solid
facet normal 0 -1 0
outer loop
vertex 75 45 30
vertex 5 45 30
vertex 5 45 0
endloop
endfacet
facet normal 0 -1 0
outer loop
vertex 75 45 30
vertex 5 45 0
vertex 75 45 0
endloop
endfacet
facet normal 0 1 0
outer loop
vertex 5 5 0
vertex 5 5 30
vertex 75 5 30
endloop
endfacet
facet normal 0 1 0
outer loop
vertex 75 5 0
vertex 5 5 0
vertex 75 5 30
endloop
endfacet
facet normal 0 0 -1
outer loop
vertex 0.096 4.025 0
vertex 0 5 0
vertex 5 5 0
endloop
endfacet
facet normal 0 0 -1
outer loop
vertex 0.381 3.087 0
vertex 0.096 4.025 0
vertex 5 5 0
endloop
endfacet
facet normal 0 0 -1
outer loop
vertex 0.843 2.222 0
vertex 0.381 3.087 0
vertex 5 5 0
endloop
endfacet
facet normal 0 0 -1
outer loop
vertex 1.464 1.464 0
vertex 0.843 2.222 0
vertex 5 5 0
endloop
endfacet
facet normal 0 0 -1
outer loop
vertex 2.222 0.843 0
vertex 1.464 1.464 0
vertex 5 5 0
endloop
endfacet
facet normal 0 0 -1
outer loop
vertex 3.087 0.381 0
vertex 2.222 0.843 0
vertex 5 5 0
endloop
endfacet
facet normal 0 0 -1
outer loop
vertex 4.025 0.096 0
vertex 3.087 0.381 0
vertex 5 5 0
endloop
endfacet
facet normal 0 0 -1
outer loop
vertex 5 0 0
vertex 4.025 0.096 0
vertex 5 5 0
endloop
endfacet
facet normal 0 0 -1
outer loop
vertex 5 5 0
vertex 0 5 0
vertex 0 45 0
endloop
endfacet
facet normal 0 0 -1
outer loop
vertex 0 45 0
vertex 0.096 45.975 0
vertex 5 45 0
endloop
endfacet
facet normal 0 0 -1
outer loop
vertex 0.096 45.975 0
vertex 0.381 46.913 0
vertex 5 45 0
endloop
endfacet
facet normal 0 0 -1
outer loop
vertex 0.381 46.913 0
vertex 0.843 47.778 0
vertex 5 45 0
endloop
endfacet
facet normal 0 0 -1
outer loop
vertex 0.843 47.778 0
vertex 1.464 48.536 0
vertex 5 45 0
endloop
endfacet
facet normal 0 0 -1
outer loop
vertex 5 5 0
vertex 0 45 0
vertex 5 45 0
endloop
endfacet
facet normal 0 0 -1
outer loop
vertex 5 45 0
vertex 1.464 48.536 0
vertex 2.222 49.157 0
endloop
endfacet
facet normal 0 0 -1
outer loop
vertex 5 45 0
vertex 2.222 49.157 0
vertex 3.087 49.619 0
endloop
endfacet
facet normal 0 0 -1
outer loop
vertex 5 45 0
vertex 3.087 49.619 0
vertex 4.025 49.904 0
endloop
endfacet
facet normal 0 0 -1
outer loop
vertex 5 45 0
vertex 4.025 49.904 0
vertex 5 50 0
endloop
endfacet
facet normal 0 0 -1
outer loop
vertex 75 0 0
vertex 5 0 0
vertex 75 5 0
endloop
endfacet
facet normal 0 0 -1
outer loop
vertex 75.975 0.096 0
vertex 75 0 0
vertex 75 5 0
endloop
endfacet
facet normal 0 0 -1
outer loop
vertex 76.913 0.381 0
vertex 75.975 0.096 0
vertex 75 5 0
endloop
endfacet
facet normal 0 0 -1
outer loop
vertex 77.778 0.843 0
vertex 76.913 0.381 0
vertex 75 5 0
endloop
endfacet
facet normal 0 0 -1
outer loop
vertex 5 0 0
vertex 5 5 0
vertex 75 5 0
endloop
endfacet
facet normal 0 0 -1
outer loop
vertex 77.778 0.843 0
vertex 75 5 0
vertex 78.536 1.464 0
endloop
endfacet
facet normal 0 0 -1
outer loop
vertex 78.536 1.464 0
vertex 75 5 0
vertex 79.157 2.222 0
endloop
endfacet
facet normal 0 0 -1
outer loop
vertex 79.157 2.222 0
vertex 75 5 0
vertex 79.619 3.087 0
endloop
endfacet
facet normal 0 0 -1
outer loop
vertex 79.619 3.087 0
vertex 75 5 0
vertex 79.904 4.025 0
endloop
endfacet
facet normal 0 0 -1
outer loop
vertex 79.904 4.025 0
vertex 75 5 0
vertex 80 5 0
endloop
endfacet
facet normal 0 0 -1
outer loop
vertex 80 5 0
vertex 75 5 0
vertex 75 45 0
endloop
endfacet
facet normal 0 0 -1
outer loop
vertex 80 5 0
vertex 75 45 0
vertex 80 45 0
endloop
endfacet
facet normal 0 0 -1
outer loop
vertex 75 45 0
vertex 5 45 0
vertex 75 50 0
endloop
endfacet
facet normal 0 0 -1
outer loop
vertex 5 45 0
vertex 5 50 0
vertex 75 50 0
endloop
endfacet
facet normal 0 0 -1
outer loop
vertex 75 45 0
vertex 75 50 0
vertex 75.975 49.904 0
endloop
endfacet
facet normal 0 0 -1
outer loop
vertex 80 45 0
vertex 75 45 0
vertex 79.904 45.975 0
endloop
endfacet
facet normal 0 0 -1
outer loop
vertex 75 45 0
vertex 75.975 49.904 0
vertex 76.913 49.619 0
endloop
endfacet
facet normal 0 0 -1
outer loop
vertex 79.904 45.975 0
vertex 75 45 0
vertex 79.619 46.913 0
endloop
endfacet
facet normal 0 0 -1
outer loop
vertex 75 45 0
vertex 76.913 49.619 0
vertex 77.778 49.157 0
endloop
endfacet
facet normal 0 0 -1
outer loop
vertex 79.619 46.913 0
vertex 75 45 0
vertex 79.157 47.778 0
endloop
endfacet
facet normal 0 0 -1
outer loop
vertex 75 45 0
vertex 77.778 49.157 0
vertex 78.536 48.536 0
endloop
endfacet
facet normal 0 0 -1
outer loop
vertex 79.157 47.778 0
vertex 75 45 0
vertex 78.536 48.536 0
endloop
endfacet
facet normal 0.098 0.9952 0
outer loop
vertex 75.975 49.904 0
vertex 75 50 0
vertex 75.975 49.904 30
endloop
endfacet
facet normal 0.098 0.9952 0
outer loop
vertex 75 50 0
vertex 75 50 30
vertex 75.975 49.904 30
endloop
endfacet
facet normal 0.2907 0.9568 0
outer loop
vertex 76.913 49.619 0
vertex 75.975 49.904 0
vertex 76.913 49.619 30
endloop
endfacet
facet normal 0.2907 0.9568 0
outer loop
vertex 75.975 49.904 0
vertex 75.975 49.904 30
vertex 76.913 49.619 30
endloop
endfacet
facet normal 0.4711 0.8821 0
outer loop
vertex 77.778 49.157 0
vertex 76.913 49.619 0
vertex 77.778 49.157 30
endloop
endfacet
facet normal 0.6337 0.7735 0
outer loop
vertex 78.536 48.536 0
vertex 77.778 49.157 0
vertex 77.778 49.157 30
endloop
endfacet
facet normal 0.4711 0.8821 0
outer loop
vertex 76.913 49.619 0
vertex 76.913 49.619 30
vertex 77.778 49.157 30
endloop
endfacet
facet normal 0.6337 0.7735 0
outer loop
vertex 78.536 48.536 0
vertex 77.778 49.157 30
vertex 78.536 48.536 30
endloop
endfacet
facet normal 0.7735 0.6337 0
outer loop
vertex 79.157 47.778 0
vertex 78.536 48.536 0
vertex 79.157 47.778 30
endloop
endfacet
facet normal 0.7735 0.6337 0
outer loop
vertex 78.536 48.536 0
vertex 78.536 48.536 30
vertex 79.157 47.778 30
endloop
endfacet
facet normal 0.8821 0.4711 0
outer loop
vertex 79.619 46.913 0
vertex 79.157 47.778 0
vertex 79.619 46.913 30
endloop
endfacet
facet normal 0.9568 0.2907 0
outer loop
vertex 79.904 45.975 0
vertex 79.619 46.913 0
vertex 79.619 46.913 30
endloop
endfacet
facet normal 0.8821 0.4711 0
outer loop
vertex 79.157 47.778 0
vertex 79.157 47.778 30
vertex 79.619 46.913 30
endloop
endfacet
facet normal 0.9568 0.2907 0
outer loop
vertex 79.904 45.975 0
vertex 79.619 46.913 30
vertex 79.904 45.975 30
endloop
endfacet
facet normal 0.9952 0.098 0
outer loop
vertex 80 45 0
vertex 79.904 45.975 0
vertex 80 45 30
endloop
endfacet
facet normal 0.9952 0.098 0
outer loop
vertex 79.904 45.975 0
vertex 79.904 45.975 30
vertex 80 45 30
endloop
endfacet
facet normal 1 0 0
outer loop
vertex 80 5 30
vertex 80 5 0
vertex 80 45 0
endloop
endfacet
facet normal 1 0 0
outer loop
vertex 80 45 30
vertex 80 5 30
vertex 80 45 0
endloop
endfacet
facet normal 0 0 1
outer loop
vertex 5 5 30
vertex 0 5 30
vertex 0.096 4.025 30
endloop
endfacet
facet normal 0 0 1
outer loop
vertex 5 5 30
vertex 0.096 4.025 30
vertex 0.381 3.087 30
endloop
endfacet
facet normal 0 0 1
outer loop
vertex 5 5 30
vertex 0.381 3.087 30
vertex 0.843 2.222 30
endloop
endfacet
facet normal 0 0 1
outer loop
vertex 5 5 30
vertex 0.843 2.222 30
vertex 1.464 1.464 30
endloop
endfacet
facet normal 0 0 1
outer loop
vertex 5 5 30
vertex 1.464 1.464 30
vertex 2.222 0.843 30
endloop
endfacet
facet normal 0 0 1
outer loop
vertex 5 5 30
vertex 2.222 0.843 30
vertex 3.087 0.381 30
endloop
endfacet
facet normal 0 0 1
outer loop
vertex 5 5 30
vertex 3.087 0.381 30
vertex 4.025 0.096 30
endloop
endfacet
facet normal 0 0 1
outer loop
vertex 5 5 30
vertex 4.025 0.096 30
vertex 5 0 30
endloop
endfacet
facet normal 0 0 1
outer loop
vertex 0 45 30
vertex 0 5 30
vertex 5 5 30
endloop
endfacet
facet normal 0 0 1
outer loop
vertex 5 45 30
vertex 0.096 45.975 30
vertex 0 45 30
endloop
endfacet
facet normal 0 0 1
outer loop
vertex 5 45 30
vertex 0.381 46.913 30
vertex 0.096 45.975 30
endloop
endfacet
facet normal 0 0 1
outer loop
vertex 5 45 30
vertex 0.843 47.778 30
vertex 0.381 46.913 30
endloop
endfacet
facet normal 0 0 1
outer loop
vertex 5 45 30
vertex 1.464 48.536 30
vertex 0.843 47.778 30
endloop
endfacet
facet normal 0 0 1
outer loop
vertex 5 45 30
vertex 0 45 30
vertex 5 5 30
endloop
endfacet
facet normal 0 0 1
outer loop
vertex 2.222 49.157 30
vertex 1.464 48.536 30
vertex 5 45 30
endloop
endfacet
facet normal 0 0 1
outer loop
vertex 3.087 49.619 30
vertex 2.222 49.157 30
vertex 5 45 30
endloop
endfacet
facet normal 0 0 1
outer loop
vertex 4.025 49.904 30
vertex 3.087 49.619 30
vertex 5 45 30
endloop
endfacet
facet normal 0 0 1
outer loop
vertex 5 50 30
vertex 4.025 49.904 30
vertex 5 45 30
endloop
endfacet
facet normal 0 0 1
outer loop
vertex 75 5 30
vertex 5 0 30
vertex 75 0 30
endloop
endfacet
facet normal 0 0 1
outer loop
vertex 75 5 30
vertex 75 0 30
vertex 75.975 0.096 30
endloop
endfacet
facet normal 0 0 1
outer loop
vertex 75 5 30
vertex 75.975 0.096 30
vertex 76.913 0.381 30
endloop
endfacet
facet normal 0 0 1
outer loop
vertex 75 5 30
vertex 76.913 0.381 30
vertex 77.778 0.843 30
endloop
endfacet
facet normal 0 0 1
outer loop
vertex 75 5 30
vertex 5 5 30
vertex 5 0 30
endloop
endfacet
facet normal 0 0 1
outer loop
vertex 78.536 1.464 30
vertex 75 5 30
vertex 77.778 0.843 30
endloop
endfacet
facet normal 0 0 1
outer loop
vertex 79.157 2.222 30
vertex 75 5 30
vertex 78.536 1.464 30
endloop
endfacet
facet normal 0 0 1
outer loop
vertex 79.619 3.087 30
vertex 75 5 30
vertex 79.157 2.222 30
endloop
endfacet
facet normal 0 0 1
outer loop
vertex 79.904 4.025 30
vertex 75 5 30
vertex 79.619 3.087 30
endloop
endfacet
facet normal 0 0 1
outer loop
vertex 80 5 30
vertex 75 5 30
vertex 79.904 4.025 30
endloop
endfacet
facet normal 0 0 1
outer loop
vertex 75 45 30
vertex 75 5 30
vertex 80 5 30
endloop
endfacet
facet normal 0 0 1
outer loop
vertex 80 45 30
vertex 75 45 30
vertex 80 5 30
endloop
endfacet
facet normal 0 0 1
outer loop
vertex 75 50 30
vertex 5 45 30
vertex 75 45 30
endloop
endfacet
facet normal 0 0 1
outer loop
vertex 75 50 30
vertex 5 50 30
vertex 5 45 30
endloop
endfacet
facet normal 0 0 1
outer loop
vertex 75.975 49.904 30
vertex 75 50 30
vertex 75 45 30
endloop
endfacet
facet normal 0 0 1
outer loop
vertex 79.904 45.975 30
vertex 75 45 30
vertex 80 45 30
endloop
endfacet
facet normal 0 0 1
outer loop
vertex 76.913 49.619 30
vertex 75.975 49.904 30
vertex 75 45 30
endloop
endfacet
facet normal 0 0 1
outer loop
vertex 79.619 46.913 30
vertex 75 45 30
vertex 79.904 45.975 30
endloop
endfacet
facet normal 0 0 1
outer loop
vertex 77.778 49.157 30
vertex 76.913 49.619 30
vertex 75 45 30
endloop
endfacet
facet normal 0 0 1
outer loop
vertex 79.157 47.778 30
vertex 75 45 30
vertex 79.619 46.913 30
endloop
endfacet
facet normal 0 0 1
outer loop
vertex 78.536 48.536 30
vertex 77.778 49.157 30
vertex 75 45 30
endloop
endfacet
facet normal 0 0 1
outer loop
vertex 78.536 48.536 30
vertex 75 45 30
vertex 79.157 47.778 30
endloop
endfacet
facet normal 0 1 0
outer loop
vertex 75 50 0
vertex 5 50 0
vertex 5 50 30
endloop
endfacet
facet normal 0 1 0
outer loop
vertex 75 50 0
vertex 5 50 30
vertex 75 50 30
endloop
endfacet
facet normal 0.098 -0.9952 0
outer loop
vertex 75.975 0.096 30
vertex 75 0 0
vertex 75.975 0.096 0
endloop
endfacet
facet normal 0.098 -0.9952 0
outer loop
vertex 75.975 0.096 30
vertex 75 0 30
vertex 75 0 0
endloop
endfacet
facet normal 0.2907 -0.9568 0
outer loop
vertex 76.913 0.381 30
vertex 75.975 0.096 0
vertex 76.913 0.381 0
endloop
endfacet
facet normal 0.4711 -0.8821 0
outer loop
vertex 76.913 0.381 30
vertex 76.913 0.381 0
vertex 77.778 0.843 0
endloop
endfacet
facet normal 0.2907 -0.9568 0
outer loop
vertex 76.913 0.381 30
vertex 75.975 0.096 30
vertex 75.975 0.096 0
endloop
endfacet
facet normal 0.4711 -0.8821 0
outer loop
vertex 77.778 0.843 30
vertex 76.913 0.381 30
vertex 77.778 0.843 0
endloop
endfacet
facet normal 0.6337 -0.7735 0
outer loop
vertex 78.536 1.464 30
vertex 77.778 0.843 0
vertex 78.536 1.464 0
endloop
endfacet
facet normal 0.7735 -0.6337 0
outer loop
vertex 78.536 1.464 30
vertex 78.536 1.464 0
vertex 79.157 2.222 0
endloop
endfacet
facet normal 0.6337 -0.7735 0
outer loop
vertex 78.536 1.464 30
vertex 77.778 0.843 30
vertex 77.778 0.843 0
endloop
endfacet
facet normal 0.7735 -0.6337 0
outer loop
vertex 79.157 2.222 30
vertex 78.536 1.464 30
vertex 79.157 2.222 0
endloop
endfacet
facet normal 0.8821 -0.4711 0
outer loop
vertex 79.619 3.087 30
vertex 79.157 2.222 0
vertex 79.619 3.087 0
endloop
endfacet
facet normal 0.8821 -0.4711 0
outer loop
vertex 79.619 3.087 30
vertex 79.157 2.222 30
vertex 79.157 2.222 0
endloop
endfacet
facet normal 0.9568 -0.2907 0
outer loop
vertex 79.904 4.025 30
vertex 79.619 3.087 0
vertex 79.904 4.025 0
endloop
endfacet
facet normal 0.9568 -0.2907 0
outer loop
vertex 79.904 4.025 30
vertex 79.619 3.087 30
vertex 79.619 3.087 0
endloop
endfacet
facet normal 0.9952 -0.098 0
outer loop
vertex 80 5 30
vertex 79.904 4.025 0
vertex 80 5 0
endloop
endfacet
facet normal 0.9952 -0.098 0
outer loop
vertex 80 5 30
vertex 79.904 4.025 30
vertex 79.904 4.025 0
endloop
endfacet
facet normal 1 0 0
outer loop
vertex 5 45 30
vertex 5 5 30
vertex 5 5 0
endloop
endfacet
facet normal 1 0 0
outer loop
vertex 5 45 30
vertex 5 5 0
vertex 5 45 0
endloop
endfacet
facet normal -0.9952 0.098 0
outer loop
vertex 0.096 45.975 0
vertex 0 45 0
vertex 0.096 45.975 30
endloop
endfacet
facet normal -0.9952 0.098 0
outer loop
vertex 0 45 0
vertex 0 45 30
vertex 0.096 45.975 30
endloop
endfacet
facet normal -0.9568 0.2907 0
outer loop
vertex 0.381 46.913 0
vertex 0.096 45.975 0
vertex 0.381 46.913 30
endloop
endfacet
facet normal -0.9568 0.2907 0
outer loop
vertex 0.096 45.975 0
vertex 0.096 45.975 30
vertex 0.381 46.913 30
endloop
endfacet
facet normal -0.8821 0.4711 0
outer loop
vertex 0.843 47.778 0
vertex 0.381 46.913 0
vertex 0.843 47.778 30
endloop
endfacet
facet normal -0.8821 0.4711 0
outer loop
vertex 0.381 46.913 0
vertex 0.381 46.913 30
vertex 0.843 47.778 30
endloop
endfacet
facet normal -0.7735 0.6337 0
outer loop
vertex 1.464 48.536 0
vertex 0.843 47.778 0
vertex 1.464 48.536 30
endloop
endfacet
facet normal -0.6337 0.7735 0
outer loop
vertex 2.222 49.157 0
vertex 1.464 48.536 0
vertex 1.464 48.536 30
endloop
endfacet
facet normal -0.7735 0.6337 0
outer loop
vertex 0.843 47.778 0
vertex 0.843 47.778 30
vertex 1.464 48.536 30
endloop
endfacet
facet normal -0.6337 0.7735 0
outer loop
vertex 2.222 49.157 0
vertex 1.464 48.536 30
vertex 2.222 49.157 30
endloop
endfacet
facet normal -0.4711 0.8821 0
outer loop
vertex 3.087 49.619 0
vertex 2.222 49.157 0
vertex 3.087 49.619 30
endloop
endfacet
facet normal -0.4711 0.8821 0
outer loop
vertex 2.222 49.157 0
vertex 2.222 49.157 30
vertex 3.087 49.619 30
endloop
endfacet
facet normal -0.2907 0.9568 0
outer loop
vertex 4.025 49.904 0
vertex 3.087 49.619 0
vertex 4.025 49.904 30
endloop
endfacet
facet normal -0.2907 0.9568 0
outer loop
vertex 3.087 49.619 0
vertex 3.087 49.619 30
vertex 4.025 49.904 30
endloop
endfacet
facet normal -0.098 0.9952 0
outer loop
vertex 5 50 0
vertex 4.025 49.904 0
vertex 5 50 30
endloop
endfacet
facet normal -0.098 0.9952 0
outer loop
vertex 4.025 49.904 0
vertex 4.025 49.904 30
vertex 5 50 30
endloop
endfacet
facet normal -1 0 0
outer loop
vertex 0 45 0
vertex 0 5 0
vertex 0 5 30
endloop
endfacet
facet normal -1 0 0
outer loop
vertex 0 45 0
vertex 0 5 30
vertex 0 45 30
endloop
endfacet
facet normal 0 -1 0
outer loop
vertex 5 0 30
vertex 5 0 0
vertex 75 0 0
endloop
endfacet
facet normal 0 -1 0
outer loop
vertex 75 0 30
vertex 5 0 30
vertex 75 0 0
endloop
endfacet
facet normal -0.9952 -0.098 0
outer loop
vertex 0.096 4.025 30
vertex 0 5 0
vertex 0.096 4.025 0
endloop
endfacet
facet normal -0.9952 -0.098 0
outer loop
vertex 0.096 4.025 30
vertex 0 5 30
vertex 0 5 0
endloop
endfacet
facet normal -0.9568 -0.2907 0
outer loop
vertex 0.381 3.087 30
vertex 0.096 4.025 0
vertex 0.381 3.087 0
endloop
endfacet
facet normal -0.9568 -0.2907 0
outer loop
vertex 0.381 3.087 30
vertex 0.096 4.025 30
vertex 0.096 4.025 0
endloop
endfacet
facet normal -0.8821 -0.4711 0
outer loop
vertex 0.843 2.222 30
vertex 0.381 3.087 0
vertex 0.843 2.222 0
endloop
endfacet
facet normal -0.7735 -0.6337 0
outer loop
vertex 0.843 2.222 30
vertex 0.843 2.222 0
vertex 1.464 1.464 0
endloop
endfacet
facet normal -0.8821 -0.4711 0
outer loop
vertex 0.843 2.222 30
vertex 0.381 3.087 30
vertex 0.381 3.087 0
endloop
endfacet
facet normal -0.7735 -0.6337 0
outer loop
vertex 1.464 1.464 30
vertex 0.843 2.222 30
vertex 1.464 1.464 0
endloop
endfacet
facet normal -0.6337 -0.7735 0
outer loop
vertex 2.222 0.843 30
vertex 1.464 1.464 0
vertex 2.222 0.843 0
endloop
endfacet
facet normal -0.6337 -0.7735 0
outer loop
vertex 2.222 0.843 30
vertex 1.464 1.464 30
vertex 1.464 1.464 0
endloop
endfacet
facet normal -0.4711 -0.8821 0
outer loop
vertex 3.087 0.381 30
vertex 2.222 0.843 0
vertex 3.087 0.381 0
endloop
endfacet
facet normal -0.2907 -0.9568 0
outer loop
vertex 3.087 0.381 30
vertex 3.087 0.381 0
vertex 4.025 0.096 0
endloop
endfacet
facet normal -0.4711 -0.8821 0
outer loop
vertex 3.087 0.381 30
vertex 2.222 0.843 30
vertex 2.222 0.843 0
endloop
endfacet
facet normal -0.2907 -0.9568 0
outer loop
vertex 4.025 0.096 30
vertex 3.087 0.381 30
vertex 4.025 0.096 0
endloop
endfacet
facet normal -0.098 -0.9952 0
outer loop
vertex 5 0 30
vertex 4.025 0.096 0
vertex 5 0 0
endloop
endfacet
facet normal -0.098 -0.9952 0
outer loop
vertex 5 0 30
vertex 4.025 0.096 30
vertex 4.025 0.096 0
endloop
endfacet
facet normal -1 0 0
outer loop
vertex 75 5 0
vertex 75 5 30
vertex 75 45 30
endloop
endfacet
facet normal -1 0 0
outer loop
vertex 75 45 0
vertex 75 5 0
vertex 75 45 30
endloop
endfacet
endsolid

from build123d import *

# Parameters (mm, degrees)
F0_W     = 80
F0_H     = 50
F1_DEPTH = 30
F2_W     = 70
F2_H     = 40
F3_DEPTH = 30.001
F4_R     = 5


with BuildPart() as f1:
    # F0 (on Top) → F1 (new body)
    with BuildSketch(Plane.XY):
        with Locations((40, 25)):
            Rectangle(F0_W, F0_H)
    extrude(amount=F1_DEPTH)

    # F2 (on face) → F3 (cut, through all)
    with BuildSketch(Plane.XY.offset(30)):
        with Locations((40, 25)):
            Rectangle(F2_W, F2_H)
    extrude(amount=-F3_DEPTH, mode=Mode.SUBTRACT)

    # F4
    f4_edges = [f1.edges().sort_by_distance(p)[0] for p in [
        (0, 0, 15),
        (80, 0, 15),
        (0, 50, 15),
        (80, 50, 15),
    ]]
    fillet(f4_edges, radius=F4_R)


solid = f1.part
